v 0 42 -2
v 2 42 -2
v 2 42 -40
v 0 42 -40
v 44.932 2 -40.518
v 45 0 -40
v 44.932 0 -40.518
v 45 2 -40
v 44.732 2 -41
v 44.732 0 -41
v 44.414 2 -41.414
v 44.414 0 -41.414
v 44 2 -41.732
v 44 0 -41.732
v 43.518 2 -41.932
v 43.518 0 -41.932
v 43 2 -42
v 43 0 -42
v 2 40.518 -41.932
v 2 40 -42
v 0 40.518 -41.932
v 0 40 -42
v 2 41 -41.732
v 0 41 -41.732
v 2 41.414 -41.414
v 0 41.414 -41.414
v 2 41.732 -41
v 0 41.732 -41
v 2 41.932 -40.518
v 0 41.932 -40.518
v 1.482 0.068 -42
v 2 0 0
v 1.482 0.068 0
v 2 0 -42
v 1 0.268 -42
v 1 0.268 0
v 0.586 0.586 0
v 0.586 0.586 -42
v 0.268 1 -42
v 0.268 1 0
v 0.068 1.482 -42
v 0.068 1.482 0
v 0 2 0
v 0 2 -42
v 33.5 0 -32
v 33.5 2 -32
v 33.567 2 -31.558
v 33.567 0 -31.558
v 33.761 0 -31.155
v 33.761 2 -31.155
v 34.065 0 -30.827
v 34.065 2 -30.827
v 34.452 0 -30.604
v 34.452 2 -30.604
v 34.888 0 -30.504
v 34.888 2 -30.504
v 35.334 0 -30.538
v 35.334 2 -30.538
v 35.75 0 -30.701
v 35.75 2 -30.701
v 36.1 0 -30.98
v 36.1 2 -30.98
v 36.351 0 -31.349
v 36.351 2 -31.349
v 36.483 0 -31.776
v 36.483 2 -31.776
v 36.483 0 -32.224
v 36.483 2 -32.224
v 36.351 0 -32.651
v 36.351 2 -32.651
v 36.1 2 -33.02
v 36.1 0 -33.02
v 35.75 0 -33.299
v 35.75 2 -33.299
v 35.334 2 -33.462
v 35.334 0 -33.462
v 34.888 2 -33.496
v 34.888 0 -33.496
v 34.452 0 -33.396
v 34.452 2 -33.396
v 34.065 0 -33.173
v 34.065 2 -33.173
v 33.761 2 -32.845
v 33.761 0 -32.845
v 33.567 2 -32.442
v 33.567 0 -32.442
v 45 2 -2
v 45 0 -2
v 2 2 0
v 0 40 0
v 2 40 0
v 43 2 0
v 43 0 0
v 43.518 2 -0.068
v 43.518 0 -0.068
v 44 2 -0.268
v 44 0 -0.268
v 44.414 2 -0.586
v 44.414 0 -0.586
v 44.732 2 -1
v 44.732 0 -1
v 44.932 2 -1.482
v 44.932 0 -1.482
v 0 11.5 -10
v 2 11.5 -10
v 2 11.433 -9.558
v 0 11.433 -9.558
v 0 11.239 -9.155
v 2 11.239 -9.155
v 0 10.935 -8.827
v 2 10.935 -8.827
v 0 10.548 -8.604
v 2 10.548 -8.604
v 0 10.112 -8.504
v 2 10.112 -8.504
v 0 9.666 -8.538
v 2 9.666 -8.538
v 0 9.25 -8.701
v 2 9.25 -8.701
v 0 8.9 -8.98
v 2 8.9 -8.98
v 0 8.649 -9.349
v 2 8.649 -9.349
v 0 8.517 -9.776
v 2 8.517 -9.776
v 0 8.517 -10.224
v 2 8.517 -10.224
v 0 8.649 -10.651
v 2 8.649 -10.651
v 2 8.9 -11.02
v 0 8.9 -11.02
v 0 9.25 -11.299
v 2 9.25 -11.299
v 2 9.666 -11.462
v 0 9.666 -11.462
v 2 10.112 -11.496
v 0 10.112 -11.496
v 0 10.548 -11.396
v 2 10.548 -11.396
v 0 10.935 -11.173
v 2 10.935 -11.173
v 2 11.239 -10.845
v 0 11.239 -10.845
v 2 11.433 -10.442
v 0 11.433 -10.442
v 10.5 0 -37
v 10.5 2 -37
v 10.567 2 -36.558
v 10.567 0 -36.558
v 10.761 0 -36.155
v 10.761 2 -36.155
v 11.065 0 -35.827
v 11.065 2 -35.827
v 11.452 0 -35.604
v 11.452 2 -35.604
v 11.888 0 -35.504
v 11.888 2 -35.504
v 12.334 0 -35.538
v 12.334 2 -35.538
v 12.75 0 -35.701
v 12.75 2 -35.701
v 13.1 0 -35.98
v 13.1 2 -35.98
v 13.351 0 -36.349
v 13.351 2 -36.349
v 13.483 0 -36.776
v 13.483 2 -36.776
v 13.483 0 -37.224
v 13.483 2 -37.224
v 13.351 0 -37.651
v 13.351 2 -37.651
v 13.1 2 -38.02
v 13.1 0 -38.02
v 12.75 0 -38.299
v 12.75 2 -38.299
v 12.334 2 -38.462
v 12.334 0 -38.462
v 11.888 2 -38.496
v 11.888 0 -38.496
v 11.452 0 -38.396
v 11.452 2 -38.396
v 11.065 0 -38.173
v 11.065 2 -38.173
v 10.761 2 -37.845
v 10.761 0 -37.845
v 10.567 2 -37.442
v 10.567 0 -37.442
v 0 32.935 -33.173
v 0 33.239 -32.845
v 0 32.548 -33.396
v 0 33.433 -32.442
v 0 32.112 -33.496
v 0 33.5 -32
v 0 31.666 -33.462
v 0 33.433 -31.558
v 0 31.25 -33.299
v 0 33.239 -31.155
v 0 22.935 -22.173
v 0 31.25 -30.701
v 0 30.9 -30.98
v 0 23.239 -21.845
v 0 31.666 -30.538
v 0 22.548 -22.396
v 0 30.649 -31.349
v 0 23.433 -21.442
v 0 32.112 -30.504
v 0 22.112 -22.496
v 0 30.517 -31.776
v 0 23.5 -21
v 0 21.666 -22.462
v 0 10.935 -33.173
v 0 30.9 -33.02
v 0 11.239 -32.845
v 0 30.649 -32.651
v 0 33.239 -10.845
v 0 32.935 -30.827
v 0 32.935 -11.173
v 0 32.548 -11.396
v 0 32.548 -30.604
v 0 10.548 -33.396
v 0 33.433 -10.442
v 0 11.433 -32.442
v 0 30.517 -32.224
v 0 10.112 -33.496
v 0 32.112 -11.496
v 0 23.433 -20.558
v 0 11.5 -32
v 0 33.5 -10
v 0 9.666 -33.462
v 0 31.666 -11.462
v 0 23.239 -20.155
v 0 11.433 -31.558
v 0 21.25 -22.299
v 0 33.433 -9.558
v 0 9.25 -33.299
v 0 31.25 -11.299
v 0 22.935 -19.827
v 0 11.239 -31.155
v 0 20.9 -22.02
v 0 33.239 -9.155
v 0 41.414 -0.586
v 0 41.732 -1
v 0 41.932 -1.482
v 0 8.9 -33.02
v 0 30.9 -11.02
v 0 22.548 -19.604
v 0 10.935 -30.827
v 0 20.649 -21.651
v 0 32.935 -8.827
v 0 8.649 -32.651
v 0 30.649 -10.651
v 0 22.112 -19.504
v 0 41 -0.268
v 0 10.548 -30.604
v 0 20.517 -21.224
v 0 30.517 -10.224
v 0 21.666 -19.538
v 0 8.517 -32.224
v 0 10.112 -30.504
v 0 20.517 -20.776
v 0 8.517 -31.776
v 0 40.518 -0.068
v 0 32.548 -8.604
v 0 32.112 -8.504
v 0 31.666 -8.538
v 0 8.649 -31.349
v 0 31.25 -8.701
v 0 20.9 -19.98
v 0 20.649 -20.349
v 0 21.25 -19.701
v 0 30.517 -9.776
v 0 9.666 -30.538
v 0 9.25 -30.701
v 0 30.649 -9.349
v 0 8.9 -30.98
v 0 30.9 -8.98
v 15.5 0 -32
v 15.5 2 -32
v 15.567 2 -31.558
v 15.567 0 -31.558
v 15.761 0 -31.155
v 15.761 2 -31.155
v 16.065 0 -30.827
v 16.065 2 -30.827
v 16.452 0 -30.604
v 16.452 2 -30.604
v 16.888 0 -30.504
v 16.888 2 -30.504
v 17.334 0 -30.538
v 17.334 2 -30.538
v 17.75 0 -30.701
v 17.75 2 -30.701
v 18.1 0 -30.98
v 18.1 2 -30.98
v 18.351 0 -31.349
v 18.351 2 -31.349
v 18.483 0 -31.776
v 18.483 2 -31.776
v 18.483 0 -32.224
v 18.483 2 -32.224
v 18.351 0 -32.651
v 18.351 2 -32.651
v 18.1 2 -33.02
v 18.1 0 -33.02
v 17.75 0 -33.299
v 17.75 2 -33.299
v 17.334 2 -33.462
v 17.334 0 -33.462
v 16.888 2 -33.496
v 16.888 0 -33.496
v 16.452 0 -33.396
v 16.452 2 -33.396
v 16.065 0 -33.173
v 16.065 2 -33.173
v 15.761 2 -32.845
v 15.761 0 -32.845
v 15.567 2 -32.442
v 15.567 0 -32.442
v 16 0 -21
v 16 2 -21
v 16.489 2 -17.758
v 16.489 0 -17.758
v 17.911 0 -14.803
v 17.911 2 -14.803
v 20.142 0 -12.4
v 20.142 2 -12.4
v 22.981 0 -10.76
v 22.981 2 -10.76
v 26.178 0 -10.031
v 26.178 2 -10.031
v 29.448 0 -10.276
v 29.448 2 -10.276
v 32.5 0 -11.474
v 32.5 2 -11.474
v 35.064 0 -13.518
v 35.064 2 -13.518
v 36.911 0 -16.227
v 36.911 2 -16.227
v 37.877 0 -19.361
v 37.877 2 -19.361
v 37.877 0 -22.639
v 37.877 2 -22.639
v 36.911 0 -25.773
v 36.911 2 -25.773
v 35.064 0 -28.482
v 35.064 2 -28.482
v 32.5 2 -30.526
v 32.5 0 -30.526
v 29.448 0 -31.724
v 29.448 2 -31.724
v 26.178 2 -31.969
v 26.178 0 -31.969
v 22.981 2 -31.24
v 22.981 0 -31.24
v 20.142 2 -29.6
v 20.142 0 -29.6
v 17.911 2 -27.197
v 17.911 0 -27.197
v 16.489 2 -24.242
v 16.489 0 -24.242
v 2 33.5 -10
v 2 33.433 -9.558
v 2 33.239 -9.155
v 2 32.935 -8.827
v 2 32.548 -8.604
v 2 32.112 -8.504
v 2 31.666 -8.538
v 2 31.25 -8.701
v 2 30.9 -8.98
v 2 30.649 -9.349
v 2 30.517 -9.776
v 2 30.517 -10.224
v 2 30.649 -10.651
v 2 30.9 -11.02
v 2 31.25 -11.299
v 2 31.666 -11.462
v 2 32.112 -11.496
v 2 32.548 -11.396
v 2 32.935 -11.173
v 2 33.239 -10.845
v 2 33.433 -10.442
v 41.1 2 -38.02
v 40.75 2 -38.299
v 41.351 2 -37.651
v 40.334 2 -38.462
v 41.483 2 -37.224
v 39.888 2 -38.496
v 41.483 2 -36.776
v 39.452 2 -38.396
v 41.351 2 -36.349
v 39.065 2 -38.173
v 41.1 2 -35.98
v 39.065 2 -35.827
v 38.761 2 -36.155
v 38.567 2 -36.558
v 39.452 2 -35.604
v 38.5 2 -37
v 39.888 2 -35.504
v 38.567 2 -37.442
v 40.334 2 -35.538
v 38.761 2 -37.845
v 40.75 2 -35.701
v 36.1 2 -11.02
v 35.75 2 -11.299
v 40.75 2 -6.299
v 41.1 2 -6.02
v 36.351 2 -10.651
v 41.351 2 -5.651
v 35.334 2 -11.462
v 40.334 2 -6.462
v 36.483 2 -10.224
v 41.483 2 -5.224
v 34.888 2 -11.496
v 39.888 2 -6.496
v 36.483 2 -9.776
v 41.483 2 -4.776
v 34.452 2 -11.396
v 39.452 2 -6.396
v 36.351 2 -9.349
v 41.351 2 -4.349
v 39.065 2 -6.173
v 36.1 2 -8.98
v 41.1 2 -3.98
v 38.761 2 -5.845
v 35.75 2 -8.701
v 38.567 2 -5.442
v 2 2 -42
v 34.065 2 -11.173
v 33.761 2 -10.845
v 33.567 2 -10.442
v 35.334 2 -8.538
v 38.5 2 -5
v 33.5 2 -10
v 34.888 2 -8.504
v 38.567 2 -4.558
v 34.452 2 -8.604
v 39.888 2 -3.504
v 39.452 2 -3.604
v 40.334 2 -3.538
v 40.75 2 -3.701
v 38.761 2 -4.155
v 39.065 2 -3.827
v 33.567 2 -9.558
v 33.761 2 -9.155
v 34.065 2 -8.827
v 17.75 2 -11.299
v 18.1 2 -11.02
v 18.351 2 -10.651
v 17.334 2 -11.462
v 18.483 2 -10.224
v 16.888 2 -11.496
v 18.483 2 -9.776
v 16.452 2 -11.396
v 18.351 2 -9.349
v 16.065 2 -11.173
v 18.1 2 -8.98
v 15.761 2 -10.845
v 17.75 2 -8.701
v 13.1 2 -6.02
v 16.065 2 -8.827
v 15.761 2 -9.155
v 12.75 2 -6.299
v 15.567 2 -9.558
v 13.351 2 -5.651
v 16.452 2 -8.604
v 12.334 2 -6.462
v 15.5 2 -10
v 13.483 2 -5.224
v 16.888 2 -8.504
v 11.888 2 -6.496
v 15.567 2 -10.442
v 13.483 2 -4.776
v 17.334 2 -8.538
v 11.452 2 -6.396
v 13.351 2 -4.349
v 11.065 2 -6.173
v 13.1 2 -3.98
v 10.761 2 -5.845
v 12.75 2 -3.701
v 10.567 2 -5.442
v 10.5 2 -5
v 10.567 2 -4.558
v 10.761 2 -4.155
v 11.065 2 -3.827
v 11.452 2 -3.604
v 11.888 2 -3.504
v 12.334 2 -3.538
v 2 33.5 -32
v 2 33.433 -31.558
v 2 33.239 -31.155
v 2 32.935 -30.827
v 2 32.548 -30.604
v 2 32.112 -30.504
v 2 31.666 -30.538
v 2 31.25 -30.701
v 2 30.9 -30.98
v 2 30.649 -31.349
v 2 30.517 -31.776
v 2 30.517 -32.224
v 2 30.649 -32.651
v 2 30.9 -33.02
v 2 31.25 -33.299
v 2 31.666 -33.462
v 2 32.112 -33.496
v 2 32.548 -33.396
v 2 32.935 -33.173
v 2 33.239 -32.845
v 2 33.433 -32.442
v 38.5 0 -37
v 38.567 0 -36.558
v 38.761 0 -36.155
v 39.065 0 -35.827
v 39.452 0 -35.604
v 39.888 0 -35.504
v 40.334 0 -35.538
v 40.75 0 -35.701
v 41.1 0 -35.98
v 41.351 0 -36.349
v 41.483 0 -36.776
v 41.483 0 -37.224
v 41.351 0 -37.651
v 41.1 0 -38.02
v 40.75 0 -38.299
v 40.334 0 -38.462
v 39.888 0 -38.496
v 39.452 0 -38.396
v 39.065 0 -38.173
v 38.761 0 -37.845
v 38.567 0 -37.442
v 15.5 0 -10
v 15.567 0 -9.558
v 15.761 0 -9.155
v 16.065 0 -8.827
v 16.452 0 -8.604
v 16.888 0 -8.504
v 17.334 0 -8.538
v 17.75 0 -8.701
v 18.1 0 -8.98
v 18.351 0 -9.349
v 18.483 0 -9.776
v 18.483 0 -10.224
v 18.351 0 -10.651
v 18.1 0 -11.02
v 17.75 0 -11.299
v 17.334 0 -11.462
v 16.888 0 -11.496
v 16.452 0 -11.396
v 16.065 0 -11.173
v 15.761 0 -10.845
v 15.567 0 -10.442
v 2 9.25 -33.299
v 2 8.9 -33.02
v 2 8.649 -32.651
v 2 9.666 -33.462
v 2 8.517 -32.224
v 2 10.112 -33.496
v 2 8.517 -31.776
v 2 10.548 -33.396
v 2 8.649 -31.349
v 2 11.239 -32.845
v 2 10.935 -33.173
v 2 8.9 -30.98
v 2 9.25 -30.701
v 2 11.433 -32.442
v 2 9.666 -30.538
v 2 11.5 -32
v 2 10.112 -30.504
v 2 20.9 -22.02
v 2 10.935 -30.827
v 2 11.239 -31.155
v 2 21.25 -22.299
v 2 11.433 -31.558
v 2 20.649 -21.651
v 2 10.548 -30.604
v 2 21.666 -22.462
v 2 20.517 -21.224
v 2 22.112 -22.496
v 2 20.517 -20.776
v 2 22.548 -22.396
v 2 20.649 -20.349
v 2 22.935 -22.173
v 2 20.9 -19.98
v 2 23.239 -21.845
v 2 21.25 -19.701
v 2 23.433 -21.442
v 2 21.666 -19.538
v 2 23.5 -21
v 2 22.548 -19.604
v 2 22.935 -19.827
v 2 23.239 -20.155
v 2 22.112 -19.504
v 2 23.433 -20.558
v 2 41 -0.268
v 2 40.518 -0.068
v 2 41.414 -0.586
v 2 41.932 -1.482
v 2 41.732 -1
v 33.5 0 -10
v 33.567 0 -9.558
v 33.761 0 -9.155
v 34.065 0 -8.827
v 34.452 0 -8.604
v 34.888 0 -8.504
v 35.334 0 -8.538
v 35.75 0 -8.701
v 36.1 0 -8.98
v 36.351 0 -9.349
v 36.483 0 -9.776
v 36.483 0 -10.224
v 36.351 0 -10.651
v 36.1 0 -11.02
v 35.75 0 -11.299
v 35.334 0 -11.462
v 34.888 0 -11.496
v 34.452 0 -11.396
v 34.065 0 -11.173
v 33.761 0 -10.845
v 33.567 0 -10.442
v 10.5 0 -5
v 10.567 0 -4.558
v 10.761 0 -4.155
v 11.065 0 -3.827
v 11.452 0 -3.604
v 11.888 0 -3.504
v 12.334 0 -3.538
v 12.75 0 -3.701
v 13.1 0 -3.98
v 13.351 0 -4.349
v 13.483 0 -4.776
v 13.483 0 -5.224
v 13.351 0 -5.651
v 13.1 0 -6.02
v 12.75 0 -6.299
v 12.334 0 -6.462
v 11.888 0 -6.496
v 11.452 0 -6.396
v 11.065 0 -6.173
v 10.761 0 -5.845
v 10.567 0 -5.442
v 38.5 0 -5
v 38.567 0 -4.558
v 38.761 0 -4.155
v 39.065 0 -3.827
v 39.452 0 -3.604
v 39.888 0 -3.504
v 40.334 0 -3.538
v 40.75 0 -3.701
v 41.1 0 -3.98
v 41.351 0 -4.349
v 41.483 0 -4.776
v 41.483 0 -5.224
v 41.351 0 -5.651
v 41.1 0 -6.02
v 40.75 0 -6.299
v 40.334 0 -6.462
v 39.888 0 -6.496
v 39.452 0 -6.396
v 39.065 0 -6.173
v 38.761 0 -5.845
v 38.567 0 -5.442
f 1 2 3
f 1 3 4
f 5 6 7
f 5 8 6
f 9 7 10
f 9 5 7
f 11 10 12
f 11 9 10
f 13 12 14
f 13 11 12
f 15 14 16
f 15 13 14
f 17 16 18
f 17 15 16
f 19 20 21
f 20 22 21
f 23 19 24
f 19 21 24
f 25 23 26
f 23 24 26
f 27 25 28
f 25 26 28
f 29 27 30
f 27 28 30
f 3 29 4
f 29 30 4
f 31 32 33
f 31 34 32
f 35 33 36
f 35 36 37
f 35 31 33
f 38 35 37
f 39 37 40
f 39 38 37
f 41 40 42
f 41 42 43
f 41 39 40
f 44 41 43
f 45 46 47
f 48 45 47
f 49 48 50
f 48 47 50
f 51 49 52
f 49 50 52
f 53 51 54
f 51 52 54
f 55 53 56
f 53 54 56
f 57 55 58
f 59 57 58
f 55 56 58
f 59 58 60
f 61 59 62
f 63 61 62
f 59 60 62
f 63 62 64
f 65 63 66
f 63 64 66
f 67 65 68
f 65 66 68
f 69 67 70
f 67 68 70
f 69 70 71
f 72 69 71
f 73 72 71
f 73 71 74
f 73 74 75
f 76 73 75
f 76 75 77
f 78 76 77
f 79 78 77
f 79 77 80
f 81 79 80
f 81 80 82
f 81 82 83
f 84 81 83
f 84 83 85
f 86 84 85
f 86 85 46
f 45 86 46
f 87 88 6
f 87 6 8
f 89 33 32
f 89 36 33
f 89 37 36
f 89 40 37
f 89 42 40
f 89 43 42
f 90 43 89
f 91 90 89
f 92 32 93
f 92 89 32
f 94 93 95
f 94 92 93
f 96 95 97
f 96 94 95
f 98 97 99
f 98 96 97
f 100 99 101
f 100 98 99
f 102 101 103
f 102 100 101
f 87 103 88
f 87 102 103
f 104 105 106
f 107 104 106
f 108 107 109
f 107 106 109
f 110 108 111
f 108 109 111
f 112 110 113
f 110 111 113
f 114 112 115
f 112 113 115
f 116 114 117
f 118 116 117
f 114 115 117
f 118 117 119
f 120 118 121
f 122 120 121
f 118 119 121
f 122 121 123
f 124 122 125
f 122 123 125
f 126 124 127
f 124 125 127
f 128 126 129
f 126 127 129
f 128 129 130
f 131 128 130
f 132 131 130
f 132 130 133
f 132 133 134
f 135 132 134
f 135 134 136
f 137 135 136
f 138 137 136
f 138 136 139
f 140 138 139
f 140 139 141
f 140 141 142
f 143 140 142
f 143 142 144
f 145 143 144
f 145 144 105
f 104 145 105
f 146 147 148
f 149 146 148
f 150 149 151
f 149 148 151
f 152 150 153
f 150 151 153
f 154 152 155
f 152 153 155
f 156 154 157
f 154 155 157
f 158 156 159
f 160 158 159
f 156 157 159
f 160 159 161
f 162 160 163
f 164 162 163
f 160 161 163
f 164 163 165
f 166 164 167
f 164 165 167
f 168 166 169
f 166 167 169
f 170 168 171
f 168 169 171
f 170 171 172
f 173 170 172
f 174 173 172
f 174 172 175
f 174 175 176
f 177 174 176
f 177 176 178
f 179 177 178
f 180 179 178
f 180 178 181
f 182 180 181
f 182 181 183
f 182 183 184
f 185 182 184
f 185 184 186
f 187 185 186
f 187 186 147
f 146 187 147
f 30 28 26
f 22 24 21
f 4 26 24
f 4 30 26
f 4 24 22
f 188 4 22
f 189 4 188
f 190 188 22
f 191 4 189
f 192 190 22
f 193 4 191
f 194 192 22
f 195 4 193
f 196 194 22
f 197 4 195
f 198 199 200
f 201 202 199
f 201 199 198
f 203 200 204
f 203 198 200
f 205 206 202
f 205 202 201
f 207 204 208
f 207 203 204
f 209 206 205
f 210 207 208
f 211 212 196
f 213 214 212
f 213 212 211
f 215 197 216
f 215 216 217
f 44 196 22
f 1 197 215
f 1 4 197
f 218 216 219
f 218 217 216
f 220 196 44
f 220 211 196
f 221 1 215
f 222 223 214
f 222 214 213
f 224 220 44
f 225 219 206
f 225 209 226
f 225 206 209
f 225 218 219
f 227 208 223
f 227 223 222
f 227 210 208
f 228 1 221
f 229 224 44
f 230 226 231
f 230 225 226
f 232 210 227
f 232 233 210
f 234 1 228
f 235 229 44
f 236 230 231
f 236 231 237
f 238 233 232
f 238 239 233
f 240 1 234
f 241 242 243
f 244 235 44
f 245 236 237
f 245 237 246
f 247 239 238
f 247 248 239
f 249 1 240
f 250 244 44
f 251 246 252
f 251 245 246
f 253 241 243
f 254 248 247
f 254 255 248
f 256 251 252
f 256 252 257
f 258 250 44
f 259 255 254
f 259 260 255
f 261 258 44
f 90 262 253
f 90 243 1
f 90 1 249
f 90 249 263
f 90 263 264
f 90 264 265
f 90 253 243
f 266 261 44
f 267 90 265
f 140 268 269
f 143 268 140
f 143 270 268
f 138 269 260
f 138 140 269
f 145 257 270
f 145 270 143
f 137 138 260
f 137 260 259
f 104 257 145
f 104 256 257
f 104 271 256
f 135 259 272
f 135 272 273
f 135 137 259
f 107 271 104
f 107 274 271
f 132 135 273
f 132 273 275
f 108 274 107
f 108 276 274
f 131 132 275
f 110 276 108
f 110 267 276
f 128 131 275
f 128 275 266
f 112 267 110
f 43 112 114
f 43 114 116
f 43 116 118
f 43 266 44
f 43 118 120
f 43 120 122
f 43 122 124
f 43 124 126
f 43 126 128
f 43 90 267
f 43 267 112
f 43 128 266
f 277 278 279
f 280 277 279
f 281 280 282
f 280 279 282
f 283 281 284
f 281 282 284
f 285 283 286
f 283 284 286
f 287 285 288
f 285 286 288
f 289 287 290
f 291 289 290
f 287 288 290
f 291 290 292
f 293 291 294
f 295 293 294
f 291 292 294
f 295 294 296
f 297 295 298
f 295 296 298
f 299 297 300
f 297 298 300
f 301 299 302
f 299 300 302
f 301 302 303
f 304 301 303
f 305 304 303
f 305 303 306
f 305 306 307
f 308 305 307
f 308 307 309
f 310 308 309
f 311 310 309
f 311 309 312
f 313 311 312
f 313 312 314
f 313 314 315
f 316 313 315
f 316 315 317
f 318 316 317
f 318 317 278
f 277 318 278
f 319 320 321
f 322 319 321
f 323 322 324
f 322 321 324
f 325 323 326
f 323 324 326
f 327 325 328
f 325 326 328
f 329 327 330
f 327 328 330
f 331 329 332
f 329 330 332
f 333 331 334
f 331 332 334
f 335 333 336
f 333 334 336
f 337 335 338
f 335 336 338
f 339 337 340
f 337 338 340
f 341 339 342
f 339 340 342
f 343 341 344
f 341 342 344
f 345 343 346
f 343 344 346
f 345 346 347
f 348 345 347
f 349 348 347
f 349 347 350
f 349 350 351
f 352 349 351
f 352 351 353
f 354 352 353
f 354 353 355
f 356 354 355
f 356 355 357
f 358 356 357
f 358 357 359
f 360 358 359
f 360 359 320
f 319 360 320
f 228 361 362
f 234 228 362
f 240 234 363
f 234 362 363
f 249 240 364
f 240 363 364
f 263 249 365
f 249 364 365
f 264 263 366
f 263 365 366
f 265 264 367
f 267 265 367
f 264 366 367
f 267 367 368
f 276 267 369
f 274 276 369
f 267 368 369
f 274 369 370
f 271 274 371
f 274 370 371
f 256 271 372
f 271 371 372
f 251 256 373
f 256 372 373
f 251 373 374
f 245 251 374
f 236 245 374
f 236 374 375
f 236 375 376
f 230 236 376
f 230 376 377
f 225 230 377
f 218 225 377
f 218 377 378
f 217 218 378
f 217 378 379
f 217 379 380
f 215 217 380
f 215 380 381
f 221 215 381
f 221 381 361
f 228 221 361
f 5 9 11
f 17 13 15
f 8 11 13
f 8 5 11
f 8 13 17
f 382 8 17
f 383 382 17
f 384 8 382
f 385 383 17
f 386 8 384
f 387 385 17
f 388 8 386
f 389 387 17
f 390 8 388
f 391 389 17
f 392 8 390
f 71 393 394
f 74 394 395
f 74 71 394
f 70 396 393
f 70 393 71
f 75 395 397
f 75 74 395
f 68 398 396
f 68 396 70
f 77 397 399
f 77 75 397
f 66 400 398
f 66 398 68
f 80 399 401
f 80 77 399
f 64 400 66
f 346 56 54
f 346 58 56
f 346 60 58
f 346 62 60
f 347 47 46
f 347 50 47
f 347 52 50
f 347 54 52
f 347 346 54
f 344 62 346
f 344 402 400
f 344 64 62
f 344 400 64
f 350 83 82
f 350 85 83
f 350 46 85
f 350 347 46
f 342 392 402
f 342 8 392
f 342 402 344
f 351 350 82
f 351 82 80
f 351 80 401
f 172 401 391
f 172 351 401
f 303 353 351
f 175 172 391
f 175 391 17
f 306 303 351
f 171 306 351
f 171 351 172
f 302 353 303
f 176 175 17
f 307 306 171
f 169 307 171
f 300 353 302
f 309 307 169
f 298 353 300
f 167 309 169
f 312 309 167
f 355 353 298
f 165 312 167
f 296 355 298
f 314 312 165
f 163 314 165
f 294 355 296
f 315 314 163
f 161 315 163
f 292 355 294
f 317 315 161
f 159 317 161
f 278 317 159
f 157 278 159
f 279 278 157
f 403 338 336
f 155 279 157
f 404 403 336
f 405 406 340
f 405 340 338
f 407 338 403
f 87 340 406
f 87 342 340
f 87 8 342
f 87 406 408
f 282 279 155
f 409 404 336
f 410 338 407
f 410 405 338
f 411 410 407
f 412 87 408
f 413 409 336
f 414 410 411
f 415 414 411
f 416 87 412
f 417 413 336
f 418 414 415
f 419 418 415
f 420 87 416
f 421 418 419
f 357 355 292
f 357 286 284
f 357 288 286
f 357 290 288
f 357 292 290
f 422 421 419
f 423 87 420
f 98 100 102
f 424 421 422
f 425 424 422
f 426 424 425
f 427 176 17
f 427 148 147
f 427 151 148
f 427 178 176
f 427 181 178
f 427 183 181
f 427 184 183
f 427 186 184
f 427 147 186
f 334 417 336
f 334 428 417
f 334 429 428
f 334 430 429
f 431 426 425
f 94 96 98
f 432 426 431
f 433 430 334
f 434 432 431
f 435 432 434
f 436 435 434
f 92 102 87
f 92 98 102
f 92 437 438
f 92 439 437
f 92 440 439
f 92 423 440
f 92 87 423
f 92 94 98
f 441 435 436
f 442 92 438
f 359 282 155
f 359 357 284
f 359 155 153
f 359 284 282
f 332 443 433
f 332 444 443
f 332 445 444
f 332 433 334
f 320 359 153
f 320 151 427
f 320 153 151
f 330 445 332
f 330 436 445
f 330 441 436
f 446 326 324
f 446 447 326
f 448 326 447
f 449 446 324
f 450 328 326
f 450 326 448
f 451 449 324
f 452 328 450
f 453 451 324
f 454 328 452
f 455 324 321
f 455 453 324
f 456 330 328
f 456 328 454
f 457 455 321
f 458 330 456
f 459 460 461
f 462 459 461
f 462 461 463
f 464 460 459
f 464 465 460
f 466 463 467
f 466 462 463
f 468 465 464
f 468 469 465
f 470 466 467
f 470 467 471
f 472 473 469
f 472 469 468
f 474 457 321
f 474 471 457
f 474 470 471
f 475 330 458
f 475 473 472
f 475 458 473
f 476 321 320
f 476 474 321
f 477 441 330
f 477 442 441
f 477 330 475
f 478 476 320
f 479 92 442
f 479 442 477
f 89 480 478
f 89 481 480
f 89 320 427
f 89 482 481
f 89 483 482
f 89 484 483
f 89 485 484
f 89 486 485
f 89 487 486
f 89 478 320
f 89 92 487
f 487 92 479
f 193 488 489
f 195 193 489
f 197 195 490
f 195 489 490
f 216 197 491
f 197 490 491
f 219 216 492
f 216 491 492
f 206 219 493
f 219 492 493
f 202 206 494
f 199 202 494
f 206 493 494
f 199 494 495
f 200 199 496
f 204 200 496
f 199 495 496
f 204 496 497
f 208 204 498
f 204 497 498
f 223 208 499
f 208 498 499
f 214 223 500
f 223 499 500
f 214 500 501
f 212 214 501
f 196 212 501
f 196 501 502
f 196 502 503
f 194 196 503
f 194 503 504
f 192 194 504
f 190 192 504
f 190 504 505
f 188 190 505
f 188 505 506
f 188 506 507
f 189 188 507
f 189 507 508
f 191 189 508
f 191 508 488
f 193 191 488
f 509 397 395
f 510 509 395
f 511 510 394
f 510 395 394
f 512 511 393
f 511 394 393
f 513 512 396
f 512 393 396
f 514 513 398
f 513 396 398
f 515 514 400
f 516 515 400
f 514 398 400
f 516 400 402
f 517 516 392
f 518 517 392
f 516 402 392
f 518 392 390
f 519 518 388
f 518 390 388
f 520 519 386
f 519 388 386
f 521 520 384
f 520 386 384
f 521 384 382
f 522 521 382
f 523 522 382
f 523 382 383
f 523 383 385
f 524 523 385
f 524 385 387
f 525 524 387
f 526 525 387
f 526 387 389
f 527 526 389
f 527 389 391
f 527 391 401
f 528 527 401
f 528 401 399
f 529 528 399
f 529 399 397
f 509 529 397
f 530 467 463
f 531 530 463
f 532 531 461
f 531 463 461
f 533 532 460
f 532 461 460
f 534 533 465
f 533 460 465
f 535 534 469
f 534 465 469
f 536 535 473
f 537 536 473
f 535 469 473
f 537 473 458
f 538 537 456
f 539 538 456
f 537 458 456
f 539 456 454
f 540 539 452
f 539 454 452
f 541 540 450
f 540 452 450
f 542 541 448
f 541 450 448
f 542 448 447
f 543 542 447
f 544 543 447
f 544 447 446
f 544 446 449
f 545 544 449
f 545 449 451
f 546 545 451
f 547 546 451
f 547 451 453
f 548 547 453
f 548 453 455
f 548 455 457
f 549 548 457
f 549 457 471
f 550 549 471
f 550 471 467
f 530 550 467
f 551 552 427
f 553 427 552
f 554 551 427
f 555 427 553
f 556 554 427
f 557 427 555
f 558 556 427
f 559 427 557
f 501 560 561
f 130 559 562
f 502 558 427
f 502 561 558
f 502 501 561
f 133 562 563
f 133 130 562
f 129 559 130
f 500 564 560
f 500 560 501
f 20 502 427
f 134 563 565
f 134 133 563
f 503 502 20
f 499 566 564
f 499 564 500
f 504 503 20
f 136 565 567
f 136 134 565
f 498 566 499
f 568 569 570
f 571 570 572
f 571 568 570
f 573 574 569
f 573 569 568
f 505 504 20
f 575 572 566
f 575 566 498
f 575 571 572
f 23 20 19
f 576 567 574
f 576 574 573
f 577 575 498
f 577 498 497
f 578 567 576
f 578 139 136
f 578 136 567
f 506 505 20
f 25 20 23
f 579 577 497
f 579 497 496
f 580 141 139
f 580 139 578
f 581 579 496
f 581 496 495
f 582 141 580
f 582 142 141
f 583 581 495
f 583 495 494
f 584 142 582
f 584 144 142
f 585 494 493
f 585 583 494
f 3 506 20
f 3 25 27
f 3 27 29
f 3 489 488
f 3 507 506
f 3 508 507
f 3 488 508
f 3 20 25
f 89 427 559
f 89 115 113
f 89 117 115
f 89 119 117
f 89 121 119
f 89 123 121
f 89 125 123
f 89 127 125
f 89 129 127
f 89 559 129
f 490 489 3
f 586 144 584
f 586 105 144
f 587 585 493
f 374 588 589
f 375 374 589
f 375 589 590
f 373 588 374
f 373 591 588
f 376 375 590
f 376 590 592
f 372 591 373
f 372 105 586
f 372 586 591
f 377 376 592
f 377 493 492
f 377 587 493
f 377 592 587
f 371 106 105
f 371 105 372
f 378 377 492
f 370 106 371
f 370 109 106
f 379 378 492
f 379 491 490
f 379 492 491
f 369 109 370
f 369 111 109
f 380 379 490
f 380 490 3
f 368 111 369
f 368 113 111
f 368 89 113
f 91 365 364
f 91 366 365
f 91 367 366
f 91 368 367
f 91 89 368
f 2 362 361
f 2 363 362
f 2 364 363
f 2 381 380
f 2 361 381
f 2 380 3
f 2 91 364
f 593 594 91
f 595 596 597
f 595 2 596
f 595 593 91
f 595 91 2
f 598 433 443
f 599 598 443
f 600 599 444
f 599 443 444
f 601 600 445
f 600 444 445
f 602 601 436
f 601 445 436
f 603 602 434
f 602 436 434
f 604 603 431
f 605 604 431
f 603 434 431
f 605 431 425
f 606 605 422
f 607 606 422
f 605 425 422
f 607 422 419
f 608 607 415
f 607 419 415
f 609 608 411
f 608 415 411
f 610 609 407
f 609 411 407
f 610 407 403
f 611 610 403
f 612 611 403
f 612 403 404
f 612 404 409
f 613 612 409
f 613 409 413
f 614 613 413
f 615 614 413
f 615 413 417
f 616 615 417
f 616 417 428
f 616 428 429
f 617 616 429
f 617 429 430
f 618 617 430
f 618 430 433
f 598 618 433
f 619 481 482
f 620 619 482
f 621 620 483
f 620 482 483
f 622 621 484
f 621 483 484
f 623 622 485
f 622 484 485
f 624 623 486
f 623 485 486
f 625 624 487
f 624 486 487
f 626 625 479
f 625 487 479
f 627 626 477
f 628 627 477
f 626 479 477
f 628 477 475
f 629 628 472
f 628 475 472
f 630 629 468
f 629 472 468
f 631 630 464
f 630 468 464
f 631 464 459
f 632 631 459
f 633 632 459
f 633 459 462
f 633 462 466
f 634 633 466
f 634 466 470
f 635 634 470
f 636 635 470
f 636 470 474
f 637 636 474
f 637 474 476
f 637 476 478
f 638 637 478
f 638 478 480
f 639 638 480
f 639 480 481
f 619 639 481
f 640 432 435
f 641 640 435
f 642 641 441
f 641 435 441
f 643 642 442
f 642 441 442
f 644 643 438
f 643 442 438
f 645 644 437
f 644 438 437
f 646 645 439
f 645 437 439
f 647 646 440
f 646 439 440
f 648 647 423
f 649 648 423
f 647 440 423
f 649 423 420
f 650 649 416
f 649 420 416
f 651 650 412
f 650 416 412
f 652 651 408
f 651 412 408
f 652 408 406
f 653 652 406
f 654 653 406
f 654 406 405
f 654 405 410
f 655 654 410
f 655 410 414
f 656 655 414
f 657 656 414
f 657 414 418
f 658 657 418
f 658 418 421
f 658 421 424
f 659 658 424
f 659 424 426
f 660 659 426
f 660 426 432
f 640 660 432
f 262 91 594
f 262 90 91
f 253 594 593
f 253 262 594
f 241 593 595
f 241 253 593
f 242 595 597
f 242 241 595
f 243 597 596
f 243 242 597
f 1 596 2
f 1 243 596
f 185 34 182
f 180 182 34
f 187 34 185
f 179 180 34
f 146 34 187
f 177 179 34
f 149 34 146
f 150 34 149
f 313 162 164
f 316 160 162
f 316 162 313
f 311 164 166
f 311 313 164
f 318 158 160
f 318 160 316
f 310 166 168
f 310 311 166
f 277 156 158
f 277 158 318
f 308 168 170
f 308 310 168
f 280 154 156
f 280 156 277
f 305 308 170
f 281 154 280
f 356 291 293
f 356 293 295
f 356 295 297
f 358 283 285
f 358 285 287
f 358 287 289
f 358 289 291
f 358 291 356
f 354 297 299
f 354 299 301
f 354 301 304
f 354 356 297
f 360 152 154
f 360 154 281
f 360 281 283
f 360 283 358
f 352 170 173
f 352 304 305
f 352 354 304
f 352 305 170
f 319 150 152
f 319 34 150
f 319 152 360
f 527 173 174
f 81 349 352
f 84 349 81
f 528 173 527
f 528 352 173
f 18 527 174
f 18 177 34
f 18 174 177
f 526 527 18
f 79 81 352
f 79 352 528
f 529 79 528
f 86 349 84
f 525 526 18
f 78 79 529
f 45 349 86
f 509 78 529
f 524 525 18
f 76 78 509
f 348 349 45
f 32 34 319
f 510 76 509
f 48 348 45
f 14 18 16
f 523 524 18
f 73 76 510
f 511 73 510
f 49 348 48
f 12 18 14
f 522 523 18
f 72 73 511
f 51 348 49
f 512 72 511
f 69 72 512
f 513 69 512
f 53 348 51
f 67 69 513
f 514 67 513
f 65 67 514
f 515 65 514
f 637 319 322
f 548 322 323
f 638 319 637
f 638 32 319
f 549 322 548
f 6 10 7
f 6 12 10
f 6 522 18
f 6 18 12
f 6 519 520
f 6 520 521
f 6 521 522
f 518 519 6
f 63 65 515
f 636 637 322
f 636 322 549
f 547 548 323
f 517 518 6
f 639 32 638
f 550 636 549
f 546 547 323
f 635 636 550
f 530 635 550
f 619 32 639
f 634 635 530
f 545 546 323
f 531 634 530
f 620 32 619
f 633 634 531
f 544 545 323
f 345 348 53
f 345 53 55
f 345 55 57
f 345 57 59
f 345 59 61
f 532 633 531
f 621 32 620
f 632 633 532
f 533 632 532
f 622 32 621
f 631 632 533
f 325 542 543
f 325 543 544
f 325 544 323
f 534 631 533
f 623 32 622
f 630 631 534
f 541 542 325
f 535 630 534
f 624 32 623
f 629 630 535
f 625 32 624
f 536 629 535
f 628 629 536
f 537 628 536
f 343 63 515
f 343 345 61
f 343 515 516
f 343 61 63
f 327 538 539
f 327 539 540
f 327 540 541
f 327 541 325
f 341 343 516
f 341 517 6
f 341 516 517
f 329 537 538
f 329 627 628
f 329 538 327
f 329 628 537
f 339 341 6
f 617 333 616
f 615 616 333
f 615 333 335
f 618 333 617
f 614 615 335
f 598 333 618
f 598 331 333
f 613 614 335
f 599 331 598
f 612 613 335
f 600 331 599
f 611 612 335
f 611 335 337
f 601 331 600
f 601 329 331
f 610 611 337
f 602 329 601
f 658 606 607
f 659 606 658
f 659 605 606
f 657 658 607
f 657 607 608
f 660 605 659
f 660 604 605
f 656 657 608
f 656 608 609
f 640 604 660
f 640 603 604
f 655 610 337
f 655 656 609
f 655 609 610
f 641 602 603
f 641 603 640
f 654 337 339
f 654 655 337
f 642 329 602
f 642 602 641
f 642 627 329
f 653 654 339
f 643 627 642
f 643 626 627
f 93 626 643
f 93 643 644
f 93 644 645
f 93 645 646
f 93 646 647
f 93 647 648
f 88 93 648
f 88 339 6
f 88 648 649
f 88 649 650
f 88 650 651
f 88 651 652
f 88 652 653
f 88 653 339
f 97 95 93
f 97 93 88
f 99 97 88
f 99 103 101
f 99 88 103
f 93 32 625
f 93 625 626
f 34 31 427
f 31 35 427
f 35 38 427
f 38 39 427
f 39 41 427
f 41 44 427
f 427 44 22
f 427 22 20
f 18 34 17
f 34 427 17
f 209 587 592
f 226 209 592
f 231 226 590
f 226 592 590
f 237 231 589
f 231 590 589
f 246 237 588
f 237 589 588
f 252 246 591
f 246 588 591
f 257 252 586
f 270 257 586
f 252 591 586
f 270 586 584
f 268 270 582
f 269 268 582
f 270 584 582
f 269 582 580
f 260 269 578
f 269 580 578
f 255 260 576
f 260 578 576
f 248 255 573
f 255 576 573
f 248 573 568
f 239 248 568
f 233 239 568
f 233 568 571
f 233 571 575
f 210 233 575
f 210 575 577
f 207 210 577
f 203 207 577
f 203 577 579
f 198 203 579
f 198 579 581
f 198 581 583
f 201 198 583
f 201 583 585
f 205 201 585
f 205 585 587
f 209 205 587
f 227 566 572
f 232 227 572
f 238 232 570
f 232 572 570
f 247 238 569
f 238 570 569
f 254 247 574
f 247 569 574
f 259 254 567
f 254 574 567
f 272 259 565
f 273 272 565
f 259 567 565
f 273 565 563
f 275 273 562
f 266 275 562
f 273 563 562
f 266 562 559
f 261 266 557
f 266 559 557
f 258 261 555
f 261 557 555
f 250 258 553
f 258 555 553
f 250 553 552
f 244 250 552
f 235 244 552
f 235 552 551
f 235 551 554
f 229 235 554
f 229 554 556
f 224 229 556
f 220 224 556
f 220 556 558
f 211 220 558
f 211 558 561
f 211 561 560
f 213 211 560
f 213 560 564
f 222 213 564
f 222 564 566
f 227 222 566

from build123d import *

# Parameters (mm, degrees)
BOSS_EXTRUDE1_DEPTH = 42
FILLET1_R           = 2
FILLET2_R           = 2
CUT_EXTRUDE1_REACH  = 75.41
SKETCH3_R           = 11
SKETCH3_R_2         = 1.5
CUT_EXTRUDE2_REACH  = 75.328
SKETCH4_R           = 1.5


with BuildPart() as part:
    # Sketch1 → Boss-Extrude1 (new body)
    with BuildSketch(Plane.XY):
        Polygon((0, 0), (45, 0), (45, 2), (2, 2), (2, 42), (0, 42), align=None)
    extrude(amount=-BOSS_EXTRUDE1_DEPTH)

    # Fillet1
    fillet1_edges = [part.edges().sort_by_distance(p)[0] for p in [
        (0, 0, -21),
    ]]
    fillet(fillet1_edges, radius=FILLET1_R)

    # Fillet2
    fillet2_edges = [part.edges().sort_by_distance(p)[0] for p in [
        (45, 1, -42),
        (1, 42, -42),
        (1, 42, 0),
        (45, 1, 0),
    ]]
    fillet(fillet2_edges, radius=FILLET2_R)

    # Sketch3 → Cut-Extrude1 (cut, up to next)
    with BuildSketch(Plane(origin=(0, 2, 0), x_dir=(1, 0, 0), z_dir=(0, 1, 0)), mode=Mode.PRIVATE) as cut_extrude1_sk1:
        with Locations(Location((27, 21, 0), (0, 0, 180))):
            Circle(SKETCH3_R)
    cut_extrude1_tool1 = extrude(cut_extrude1_sk1.sketch, amount=-CUT_EXTRUDE1_REACH, mode=Mode.PRIVATE) & part.part
    # Sketch3 → Cut-Extrude1 (cut, up to next)
    with BuildSketch(Plane(origin=(0, 2, 0), x_dir=(1, 0, 0), z_dir=(0, 1, 0)), mode=Mode.PRIVATE) as cut_extrude1_sk2:
        with Locations(Location((40, 37, 0), (0, 0, 180))):
            Circle(SKETCH3_R_2)
    cut_extrude1_tool2 = extrude(cut_extrude1_sk2.sketch, amount=-CUT_EXTRUDE1_REACH, mode=Mode.PRIVATE) & part.part
    # Sketch3 → Cut-Extrude1 (cut, up to next)
    with BuildSketch(Plane(origin=(0, 2, 0), x_dir=(1, 0, 0), z_dir=(0, 1, 0)), mode=Mode.PRIVATE) as cut_extrude1_sk3:
        with Locations(Location((40, 5, 0), (0, 0, 180))):
            Circle(SKETCH3_R_2)
    cut_extrude1_tool3 = extrude(cut_extrude1_sk3.sketch, amount=-CUT_EXTRUDE1_REACH, mode=Mode.PRIVATE) & part.part
    # Sketch3 → Cut-Extrude1 (cut, up to next)
    with BuildSketch(Plane(origin=(0, 2, 0), x_dir=(1, 0, 0), z_dir=(0, 1, 0)), mode=Mode.PRIVATE) as cut_extrude1_sk4:
        with Locations(Location((35, 32, 0), (0, 0, 180))):
            Circle(SKETCH3_R_2)
    cut_extrude1_tool4 = extrude(cut_extrude1_sk4.sketch, amount=-CUT_EXTRUDE1_REACH, mode=Mode.PRIVATE) & part.part
    # Sketch3 → Cut-Extrude1 (cut, up to next)
    with BuildSketch(Plane(origin=(0, 2, 0), x_dir=(1, 0, 0), z_dir=(0, 1, 0)), mode=Mode.PRIVATE) as cut_extrude1_sk5:
        with Locations(Location((35, 10, 0), (0, 0, 180))):
            Circle(SKETCH3_R_2)
    cut_extrude1_tool5 = extrude(cut_extrude1_sk5.sketch, amount=-CUT_EXTRUDE1_REACH, mode=Mode.PRIVATE) & part.part
    # Sketch3 → Cut-Extrude1 (cut, up to next)
    with BuildSketch(Plane(origin=(0, 2, 0), x_dir=(1, 0, 0), z_dir=(0, 1, 0)), mode=Mode.PRIVATE) as cut_extrude1_sk6:
        with Locations(Location((17, 10, 0), (0, 0, 180))):
            Circle(SKETCH3_R_2)
    cut_extrude1_tool6 = extrude(cut_extrude1_sk6.sketch, amount=-CUT_EXTRUDE1_REACH, mode=Mode.PRIVATE) & part.part
    # Sketch3 → Cut-Extrude1 (cut, up to next)
    with BuildSketch(Plane(origin=(0, 2, 0), x_dir=(1, 0, 0), z_dir=(0, 1, 0)), mode=Mode.PRIVATE) as cut_extrude1_sk7:
        with Locations(Location((17, 32, 0), (0, 0, 180))):
            Circle(SKETCH3_R_2)
    cut_extrude1_tool7 = extrude(cut_extrude1_sk7.sketch, amount=-CUT_EXTRUDE1_REACH, mode=Mode.PRIVATE) & part.part
    # Sketch3 → Cut-Extrude1 (cut, up to next)
    with BuildSketch(Plane(origin=(0, 2, 0), x_dir=(1, 0, 0), z_dir=(0, 1, 0)), mode=Mode.PRIVATE) as cut_extrude1_sk8:
        with Locations(Location((12, 37, 0), (0, 0, 180))):
            Circle(SKETCH3_R_2)
    cut_extrude1_tool8 = extrude(cut_extrude1_sk8.sketch, amount=-CUT_EXTRUDE1_REACH, mode=Mode.PRIVATE) & part.part
    # Sketch3 → Cut-Extrude1 (cut, up to next)
    with BuildSketch(Plane(origin=(0, 2, 0), x_dir=(1, 0, 0), z_dir=(0, 1, 0)), mode=Mode.PRIVATE) as cut_extrude1_sk9:
        with Locations(Location((12, 5, 0), (0, 0, 180))):
            Circle(SKETCH3_R_2)
    cut_extrude1_tool9 = extrude(cut_extrude1_sk9.sketch, amount=-CUT_EXTRUDE1_REACH, mode=Mode.PRIVATE) & part.part
    add(cut_extrude1_tool1.solids().sort_by_distance((27, 2, -21))[0], mode=Mode.SUBTRACT)
    add(cut_extrude1_tool2.solids().sort_by_distance((40, 2, -37))[0], mode=Mode.SUBTRACT)
    add(cut_extrude1_tool3.solids().sort_by_distance((40, 2, -5))[0], mode=Mode.SUBTRACT)
    add(cut_extrude1_tool4.solids().sort_by_distance((35, 2, -32))[0], mode=Mode.SUBTRACT)
    add(cut_extrude1_tool5.solids().sort_by_distance((35, 2, -10))[0], mode=Mode.SUBTRACT)
    add(cut_extrude1_tool6.solids().sort_by_distance((17, 2, -10))[0], mode=Mode.SUBTRACT)
    add(cut_extrude1_tool7.solids().sort_by_distance((17, 2, -32))[0], mode=Mode.SUBTRACT)
    add(cut_extrude1_tool8.solids().sort_by_distance((12, 2, -37))[0], mode=Mode.SUBTRACT)
    add(cut_extrude1_tool9.solids().sort_by_distance((12, 2, -5))[0], mode=Mode.SUBTRACT)

    # Sketch4 → Cut-Extrude2 (cut, up to next)
    with BuildSketch(Plane(origin=(2, 0, 0), x_dir=(0, 0, -1), z_dir=(1, 0, 0)), mode=Mode.PRIVATE) as cut_extrude2_sk1:
        with Locations(Location((21, 22, 0), (0, 0, 90))):
            Circle(SKETCH4_R)
    cut_extrude2_tool1 = extrude(cut_extrude2_sk1.sketch, amount=-CUT_EXTRUDE2_REACH, mode=Mode.PRIVATE) & part.part
    # Sketch4 → Cut-Extrude2 (cut, up to next)
    with BuildSketch(Plane(origin=(2, 0, 0), x_dir=(0, 0, -1), z_dir=(1, 0, 0)), mode=Mode.PRIVATE) as cut_extrude2_sk2:
        with Locations(Location((10, 32, 0), (0, 0, 90))):
            Circle(SKETCH4_R)
    cut_extrude2_tool2 = extrude(cut_extrude2_sk2.sketch, amount=-CUT_EXTRUDE2_REACH, mode=Mode.PRIVATE) & part.part
    # Sketch4 → Cut-Extrude2 (cut, up to next)
    with BuildSketch(Plane(origin=(2, 0, 0), x_dir=(0, 0, -1), z_dir=(1, 0, 0)), mode=Mode.PRIVATE) as cut_extrude2_sk3:
        with Locations(Location((32, 32, 0), (0, 0, 90))):
            Circle(SKETCH4_R)
    cut_extrude2_tool3 = extrude(cut_extrude2_sk3.sketch, amount=-CUT_EXTRUDE2_REACH, mode=Mode.PRIVATE) & part.part
    # Sketch4 → Cut-Extrude2 (cut, up to next)
    with BuildSketch(Plane(origin=(2, 0, 0), x_dir=(0, 0, -1), z_dir=(1, 0, 0)), mode=Mode.PRIVATE) as cut_extrude2_sk4:
        with Locations(Location((10, 10, 0), (0, 0, 90))):
            Circle(SKETCH4_R)
    cut_extrude2_tool4 = extrude(cut_extrude2_sk4.sketch, amount=-CUT_EXTRUDE2_REACH, mode=Mode.PRIVATE) & part.part
    # Sketch4 → Cut-Extrude2 (cut, up to next)
    with BuildSketch(Plane(origin=(2, 0, 0), x_dir=(0, 0, -1), z_dir=(1, 0, 0)), mode=Mode.PRIVATE) as cut_extrude2_sk5:
        with Locations(Location((32, 10, 0), (0, 0, 90))):
            Circle(SKETCH4_R)
    cut_extrude2_tool5 = extrude(cut_extrude2_sk5.sketch, amount=-CUT_EXTRUDE2_REACH, mode=Mode.PRIVATE) & part.part
    add(cut_extrude2_tool1.solids().sort_by_distance((2, 22, -21))[0], mode=Mode.SUBTRACT)
    add(cut_extrude2_tool2.solids().sort_by_distance((2, 32, -10))[0], mode=Mode.SUBTRACT)
    add(cut_extrude2_tool3.solids().sort_by_distance((2, 32, -32))[0], mode=Mode.SUBTRACT)
    add(cut_extrude2_tool4.solids().sort_by_distance((2, 10, -10))[0], mode=Mode.SUBTRACT)
    add(cut_extrude2_tool5.solids().sort_by_distance((2, 10, -32))[0], mode=Mode.SUBTRACT)


solid = part.part
